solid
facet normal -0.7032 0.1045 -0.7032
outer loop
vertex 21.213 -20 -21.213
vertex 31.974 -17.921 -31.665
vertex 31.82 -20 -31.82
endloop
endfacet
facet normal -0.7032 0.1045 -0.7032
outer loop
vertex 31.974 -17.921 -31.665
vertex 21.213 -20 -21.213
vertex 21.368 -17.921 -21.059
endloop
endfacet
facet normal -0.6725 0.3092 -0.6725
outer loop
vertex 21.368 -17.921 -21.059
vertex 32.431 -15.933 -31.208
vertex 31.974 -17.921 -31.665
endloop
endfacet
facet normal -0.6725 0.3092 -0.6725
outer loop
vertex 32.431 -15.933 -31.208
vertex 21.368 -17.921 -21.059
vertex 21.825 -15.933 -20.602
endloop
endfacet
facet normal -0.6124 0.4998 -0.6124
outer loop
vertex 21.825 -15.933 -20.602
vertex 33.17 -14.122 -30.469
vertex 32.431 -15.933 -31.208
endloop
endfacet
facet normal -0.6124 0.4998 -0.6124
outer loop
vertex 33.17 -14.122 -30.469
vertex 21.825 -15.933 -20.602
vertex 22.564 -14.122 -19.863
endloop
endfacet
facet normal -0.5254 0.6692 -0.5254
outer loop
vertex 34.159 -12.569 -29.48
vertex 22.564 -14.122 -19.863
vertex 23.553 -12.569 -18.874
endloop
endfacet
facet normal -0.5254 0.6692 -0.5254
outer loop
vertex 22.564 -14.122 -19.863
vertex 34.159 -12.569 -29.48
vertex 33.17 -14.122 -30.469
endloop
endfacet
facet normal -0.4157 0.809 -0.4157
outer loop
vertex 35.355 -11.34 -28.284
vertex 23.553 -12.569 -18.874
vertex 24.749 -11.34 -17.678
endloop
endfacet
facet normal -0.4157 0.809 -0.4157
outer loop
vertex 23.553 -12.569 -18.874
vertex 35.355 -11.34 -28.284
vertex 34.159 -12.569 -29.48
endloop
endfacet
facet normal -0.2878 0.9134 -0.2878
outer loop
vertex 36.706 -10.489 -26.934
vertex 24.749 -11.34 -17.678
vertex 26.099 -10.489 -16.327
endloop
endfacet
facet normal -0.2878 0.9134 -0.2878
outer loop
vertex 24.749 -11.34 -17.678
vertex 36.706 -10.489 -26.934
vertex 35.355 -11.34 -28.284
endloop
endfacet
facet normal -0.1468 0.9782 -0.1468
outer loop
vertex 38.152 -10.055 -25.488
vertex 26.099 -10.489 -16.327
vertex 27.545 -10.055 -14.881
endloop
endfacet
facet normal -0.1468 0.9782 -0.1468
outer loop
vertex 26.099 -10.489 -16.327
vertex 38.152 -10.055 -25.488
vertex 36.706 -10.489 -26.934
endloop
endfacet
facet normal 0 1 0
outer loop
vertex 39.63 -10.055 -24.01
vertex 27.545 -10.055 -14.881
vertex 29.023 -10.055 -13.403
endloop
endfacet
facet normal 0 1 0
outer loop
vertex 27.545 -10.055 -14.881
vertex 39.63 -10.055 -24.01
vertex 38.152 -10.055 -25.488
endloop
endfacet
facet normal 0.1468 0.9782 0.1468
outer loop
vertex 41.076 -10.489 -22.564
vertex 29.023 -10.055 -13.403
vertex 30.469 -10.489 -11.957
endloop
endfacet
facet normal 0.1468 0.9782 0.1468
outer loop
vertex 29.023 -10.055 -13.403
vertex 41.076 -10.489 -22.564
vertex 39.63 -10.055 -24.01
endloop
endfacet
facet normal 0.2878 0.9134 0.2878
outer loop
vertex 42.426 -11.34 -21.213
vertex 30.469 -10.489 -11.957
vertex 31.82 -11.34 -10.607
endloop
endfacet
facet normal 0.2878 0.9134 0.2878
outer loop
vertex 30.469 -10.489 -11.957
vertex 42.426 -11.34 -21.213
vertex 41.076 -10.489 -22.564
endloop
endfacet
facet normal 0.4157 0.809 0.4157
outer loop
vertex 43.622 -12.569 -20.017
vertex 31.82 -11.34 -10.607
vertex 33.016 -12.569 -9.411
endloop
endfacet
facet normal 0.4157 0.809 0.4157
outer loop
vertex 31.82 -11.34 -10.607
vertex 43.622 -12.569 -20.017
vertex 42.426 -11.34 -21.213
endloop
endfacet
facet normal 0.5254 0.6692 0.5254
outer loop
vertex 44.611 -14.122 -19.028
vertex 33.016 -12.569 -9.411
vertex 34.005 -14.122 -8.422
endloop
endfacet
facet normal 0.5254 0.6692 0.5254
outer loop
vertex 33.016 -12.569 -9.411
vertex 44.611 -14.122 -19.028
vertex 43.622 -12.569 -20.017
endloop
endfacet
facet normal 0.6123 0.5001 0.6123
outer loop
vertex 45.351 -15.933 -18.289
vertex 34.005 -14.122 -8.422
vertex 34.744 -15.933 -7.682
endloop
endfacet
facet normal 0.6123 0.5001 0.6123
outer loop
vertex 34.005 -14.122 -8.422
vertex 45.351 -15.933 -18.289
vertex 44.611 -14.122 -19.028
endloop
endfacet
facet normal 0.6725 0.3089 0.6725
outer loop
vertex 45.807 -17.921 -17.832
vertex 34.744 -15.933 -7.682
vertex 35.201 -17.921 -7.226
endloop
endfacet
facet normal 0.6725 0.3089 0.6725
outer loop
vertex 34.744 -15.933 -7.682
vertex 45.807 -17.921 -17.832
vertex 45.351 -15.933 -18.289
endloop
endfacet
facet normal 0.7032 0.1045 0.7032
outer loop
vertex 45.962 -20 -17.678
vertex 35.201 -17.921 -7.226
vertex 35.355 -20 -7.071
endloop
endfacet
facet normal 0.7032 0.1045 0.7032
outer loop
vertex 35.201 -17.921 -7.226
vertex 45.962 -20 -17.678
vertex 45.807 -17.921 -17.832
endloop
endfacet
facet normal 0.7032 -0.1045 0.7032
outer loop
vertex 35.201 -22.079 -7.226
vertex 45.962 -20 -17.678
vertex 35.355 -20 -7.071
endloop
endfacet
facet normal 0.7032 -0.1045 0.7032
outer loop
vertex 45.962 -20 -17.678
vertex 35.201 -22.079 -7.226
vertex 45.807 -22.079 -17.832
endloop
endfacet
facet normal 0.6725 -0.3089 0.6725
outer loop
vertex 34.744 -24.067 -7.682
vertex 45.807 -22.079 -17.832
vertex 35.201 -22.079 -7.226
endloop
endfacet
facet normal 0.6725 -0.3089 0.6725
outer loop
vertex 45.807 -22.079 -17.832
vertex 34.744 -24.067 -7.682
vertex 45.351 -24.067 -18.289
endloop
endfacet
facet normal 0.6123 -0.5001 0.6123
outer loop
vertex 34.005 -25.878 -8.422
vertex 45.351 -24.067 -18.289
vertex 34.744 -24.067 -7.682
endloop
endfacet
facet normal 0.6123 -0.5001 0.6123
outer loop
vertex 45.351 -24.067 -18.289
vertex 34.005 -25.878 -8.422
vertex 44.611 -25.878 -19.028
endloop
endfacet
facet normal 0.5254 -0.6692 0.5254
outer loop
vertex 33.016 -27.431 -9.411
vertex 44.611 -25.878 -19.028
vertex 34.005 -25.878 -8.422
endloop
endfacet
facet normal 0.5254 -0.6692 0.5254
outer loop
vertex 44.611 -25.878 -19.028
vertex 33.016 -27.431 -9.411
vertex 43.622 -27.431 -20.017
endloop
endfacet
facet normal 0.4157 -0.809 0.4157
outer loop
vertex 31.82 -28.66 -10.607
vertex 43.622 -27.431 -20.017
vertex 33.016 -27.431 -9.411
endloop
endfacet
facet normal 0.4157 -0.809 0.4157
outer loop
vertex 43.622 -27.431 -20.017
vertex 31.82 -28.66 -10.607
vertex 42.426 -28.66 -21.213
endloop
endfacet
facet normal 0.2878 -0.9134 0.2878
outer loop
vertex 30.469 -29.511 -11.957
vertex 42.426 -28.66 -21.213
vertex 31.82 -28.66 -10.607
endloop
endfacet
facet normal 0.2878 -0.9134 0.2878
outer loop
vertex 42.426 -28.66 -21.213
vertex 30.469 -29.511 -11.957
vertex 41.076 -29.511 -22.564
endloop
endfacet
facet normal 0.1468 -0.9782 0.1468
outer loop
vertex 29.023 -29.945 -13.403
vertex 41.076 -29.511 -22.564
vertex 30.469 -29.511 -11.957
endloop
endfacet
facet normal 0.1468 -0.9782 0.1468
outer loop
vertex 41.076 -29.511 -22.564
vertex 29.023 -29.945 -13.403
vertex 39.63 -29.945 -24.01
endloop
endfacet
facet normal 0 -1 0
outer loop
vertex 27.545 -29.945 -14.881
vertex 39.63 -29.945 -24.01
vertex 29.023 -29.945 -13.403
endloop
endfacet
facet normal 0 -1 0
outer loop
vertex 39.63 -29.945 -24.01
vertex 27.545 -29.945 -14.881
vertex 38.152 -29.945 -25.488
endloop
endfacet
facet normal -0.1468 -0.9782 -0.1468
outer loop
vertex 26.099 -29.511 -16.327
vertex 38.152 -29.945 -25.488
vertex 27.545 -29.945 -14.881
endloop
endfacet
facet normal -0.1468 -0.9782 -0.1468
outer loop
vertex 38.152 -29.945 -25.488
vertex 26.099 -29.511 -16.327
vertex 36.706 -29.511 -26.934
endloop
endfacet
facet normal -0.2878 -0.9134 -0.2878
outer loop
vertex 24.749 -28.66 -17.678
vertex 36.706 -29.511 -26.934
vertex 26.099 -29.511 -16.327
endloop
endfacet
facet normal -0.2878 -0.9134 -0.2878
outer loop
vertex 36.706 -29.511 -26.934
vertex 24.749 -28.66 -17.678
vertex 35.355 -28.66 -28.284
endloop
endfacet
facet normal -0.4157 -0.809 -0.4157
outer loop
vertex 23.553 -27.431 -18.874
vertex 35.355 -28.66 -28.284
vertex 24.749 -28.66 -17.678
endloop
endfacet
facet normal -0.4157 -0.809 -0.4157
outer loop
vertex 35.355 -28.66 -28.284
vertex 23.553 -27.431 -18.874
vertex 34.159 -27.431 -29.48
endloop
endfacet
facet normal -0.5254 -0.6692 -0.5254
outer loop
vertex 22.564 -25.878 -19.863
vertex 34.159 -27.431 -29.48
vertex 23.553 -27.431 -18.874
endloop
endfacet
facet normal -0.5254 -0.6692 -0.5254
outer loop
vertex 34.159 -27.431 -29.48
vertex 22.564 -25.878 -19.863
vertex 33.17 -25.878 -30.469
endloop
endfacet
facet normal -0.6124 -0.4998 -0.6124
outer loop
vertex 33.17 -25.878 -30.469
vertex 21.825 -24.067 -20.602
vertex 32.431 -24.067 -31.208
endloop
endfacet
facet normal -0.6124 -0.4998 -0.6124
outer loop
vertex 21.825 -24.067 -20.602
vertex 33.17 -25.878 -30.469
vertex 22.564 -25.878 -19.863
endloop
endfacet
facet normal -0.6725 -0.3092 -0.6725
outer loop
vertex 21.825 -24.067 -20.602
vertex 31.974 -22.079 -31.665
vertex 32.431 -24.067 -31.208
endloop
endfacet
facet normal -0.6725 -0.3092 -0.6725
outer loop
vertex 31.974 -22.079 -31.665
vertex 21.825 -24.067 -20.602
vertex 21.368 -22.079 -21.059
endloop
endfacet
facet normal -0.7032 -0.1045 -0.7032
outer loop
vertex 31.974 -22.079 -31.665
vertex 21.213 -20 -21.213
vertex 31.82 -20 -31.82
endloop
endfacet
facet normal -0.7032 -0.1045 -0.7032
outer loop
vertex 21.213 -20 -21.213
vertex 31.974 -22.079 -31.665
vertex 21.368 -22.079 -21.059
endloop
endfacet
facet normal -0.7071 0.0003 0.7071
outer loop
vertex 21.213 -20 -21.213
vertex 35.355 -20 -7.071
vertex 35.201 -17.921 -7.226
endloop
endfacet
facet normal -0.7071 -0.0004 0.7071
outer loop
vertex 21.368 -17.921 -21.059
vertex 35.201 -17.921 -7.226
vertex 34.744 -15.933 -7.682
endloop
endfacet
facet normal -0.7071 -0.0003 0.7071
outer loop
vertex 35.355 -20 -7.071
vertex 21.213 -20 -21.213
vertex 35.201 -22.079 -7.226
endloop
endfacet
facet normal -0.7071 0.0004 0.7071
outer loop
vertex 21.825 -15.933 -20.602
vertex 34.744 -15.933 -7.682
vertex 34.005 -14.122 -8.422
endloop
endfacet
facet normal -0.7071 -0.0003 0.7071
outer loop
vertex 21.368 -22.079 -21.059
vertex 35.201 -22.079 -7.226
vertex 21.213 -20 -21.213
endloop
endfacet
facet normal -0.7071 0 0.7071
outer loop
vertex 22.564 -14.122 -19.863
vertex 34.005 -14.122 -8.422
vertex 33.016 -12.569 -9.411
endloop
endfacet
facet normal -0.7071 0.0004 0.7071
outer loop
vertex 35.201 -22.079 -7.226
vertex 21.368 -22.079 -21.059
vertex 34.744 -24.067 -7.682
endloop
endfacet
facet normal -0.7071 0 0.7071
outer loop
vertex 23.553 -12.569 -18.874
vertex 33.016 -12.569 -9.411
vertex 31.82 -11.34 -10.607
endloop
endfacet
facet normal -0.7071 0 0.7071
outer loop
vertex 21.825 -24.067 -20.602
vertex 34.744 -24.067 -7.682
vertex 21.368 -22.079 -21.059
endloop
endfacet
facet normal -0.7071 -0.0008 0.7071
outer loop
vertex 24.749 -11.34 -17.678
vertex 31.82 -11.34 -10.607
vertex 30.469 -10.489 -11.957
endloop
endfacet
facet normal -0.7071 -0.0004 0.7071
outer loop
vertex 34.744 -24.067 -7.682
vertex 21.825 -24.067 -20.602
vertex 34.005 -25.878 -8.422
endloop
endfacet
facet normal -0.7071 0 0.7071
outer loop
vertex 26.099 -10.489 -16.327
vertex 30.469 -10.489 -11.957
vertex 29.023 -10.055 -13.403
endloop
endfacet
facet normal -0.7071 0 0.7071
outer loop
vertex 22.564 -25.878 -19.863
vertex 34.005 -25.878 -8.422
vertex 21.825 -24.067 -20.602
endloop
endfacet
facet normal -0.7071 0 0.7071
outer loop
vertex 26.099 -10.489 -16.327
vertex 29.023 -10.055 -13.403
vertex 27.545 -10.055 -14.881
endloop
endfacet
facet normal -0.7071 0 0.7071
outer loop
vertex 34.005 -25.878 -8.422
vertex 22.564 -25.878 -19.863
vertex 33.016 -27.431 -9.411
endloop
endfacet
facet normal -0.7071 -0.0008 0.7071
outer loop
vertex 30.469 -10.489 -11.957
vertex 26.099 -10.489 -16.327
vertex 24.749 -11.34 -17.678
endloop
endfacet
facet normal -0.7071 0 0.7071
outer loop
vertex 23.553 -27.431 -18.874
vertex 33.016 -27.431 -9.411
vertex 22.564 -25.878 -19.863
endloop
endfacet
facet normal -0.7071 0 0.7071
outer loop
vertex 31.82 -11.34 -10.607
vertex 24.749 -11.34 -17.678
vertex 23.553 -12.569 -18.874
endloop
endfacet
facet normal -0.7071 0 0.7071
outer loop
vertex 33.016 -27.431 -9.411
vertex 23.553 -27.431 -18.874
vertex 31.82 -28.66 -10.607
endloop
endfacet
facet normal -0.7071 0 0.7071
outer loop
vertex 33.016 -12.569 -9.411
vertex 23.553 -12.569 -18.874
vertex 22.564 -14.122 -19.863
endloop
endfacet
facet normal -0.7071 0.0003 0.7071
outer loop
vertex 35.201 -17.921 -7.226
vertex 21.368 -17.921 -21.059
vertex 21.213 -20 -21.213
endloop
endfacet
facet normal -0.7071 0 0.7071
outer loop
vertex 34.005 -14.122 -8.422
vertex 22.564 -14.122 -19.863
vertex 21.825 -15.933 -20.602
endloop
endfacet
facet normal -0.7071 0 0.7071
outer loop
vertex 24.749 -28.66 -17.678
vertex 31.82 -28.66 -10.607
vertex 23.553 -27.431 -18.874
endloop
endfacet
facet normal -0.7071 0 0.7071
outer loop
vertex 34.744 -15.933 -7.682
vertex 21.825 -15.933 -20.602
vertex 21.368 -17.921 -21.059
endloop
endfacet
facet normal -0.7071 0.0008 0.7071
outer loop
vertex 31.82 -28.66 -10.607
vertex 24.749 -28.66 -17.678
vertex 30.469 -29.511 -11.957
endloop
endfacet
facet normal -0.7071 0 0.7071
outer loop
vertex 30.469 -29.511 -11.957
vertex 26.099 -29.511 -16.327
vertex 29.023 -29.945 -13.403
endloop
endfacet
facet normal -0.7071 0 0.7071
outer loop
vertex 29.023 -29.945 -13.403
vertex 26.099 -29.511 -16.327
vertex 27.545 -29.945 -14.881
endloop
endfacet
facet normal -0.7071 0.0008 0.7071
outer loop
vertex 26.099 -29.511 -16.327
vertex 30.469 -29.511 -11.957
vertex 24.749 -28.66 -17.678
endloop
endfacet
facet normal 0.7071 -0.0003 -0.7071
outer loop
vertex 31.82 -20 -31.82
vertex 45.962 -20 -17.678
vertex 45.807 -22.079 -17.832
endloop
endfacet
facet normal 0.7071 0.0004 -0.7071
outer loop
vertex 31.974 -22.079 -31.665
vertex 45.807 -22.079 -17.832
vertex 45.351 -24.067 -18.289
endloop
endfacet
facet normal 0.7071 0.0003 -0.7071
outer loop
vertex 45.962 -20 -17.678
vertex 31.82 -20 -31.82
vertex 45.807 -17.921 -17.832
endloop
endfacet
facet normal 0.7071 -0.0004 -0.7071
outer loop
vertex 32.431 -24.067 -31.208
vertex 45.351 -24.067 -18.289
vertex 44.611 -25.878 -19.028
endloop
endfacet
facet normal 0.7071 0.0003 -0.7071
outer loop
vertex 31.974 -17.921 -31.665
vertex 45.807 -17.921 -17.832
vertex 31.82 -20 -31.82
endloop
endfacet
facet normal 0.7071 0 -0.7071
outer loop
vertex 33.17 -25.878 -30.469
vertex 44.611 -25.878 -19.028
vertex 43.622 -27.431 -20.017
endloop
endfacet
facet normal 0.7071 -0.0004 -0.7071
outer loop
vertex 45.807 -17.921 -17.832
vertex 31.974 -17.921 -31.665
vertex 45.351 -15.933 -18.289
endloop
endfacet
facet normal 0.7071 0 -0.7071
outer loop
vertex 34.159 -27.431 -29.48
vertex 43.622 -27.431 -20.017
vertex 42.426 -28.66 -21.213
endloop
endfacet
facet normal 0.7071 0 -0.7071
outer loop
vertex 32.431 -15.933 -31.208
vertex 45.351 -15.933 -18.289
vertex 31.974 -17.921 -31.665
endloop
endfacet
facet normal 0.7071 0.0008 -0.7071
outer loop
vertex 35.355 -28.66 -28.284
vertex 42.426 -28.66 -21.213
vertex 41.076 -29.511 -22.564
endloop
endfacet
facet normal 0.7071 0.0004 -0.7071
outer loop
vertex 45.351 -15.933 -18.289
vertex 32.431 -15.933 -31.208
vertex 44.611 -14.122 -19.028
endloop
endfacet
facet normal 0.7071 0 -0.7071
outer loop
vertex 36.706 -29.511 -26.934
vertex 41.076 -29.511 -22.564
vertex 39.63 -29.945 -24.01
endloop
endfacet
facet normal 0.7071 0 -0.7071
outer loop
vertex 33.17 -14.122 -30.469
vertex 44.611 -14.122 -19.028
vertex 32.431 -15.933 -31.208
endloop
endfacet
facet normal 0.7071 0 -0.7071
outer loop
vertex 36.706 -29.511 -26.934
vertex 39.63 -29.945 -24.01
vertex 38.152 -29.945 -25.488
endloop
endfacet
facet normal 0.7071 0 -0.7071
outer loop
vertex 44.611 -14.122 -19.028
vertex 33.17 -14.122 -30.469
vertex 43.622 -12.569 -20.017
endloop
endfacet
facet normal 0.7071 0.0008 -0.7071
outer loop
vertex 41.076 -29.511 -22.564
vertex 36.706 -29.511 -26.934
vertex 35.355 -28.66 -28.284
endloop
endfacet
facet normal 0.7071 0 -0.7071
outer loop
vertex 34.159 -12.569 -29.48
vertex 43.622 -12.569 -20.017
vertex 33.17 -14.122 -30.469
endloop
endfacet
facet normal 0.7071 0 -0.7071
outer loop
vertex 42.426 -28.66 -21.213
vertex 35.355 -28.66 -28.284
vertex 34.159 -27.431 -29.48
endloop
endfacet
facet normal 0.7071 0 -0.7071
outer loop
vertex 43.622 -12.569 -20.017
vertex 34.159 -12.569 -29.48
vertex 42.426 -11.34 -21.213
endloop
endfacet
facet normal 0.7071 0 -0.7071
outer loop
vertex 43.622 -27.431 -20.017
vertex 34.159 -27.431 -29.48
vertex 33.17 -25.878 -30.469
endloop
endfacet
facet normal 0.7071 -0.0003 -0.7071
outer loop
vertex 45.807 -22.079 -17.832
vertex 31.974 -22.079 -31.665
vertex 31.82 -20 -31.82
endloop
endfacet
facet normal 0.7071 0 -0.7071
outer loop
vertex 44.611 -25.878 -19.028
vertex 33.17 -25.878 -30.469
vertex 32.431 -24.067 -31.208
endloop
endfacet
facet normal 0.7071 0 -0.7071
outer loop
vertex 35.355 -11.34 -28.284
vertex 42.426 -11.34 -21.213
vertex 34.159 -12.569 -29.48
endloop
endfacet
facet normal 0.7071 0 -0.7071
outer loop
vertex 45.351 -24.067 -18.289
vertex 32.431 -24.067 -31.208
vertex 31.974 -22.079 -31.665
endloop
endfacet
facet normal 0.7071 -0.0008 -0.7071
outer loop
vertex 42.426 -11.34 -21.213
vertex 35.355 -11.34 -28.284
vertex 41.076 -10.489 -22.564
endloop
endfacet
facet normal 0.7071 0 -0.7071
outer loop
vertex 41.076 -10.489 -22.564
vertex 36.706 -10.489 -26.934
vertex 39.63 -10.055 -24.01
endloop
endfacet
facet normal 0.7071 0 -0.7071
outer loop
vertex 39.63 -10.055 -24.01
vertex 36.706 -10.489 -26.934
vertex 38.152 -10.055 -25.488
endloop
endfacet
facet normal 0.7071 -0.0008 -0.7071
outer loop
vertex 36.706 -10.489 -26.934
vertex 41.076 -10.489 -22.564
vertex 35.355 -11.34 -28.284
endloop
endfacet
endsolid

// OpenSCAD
// Generated by generate_scads.py
rotate([180,45,180]) {
  translate([-10,-20,30]) {
    cylinder(h=15, r=10, center=false);
  }
}
